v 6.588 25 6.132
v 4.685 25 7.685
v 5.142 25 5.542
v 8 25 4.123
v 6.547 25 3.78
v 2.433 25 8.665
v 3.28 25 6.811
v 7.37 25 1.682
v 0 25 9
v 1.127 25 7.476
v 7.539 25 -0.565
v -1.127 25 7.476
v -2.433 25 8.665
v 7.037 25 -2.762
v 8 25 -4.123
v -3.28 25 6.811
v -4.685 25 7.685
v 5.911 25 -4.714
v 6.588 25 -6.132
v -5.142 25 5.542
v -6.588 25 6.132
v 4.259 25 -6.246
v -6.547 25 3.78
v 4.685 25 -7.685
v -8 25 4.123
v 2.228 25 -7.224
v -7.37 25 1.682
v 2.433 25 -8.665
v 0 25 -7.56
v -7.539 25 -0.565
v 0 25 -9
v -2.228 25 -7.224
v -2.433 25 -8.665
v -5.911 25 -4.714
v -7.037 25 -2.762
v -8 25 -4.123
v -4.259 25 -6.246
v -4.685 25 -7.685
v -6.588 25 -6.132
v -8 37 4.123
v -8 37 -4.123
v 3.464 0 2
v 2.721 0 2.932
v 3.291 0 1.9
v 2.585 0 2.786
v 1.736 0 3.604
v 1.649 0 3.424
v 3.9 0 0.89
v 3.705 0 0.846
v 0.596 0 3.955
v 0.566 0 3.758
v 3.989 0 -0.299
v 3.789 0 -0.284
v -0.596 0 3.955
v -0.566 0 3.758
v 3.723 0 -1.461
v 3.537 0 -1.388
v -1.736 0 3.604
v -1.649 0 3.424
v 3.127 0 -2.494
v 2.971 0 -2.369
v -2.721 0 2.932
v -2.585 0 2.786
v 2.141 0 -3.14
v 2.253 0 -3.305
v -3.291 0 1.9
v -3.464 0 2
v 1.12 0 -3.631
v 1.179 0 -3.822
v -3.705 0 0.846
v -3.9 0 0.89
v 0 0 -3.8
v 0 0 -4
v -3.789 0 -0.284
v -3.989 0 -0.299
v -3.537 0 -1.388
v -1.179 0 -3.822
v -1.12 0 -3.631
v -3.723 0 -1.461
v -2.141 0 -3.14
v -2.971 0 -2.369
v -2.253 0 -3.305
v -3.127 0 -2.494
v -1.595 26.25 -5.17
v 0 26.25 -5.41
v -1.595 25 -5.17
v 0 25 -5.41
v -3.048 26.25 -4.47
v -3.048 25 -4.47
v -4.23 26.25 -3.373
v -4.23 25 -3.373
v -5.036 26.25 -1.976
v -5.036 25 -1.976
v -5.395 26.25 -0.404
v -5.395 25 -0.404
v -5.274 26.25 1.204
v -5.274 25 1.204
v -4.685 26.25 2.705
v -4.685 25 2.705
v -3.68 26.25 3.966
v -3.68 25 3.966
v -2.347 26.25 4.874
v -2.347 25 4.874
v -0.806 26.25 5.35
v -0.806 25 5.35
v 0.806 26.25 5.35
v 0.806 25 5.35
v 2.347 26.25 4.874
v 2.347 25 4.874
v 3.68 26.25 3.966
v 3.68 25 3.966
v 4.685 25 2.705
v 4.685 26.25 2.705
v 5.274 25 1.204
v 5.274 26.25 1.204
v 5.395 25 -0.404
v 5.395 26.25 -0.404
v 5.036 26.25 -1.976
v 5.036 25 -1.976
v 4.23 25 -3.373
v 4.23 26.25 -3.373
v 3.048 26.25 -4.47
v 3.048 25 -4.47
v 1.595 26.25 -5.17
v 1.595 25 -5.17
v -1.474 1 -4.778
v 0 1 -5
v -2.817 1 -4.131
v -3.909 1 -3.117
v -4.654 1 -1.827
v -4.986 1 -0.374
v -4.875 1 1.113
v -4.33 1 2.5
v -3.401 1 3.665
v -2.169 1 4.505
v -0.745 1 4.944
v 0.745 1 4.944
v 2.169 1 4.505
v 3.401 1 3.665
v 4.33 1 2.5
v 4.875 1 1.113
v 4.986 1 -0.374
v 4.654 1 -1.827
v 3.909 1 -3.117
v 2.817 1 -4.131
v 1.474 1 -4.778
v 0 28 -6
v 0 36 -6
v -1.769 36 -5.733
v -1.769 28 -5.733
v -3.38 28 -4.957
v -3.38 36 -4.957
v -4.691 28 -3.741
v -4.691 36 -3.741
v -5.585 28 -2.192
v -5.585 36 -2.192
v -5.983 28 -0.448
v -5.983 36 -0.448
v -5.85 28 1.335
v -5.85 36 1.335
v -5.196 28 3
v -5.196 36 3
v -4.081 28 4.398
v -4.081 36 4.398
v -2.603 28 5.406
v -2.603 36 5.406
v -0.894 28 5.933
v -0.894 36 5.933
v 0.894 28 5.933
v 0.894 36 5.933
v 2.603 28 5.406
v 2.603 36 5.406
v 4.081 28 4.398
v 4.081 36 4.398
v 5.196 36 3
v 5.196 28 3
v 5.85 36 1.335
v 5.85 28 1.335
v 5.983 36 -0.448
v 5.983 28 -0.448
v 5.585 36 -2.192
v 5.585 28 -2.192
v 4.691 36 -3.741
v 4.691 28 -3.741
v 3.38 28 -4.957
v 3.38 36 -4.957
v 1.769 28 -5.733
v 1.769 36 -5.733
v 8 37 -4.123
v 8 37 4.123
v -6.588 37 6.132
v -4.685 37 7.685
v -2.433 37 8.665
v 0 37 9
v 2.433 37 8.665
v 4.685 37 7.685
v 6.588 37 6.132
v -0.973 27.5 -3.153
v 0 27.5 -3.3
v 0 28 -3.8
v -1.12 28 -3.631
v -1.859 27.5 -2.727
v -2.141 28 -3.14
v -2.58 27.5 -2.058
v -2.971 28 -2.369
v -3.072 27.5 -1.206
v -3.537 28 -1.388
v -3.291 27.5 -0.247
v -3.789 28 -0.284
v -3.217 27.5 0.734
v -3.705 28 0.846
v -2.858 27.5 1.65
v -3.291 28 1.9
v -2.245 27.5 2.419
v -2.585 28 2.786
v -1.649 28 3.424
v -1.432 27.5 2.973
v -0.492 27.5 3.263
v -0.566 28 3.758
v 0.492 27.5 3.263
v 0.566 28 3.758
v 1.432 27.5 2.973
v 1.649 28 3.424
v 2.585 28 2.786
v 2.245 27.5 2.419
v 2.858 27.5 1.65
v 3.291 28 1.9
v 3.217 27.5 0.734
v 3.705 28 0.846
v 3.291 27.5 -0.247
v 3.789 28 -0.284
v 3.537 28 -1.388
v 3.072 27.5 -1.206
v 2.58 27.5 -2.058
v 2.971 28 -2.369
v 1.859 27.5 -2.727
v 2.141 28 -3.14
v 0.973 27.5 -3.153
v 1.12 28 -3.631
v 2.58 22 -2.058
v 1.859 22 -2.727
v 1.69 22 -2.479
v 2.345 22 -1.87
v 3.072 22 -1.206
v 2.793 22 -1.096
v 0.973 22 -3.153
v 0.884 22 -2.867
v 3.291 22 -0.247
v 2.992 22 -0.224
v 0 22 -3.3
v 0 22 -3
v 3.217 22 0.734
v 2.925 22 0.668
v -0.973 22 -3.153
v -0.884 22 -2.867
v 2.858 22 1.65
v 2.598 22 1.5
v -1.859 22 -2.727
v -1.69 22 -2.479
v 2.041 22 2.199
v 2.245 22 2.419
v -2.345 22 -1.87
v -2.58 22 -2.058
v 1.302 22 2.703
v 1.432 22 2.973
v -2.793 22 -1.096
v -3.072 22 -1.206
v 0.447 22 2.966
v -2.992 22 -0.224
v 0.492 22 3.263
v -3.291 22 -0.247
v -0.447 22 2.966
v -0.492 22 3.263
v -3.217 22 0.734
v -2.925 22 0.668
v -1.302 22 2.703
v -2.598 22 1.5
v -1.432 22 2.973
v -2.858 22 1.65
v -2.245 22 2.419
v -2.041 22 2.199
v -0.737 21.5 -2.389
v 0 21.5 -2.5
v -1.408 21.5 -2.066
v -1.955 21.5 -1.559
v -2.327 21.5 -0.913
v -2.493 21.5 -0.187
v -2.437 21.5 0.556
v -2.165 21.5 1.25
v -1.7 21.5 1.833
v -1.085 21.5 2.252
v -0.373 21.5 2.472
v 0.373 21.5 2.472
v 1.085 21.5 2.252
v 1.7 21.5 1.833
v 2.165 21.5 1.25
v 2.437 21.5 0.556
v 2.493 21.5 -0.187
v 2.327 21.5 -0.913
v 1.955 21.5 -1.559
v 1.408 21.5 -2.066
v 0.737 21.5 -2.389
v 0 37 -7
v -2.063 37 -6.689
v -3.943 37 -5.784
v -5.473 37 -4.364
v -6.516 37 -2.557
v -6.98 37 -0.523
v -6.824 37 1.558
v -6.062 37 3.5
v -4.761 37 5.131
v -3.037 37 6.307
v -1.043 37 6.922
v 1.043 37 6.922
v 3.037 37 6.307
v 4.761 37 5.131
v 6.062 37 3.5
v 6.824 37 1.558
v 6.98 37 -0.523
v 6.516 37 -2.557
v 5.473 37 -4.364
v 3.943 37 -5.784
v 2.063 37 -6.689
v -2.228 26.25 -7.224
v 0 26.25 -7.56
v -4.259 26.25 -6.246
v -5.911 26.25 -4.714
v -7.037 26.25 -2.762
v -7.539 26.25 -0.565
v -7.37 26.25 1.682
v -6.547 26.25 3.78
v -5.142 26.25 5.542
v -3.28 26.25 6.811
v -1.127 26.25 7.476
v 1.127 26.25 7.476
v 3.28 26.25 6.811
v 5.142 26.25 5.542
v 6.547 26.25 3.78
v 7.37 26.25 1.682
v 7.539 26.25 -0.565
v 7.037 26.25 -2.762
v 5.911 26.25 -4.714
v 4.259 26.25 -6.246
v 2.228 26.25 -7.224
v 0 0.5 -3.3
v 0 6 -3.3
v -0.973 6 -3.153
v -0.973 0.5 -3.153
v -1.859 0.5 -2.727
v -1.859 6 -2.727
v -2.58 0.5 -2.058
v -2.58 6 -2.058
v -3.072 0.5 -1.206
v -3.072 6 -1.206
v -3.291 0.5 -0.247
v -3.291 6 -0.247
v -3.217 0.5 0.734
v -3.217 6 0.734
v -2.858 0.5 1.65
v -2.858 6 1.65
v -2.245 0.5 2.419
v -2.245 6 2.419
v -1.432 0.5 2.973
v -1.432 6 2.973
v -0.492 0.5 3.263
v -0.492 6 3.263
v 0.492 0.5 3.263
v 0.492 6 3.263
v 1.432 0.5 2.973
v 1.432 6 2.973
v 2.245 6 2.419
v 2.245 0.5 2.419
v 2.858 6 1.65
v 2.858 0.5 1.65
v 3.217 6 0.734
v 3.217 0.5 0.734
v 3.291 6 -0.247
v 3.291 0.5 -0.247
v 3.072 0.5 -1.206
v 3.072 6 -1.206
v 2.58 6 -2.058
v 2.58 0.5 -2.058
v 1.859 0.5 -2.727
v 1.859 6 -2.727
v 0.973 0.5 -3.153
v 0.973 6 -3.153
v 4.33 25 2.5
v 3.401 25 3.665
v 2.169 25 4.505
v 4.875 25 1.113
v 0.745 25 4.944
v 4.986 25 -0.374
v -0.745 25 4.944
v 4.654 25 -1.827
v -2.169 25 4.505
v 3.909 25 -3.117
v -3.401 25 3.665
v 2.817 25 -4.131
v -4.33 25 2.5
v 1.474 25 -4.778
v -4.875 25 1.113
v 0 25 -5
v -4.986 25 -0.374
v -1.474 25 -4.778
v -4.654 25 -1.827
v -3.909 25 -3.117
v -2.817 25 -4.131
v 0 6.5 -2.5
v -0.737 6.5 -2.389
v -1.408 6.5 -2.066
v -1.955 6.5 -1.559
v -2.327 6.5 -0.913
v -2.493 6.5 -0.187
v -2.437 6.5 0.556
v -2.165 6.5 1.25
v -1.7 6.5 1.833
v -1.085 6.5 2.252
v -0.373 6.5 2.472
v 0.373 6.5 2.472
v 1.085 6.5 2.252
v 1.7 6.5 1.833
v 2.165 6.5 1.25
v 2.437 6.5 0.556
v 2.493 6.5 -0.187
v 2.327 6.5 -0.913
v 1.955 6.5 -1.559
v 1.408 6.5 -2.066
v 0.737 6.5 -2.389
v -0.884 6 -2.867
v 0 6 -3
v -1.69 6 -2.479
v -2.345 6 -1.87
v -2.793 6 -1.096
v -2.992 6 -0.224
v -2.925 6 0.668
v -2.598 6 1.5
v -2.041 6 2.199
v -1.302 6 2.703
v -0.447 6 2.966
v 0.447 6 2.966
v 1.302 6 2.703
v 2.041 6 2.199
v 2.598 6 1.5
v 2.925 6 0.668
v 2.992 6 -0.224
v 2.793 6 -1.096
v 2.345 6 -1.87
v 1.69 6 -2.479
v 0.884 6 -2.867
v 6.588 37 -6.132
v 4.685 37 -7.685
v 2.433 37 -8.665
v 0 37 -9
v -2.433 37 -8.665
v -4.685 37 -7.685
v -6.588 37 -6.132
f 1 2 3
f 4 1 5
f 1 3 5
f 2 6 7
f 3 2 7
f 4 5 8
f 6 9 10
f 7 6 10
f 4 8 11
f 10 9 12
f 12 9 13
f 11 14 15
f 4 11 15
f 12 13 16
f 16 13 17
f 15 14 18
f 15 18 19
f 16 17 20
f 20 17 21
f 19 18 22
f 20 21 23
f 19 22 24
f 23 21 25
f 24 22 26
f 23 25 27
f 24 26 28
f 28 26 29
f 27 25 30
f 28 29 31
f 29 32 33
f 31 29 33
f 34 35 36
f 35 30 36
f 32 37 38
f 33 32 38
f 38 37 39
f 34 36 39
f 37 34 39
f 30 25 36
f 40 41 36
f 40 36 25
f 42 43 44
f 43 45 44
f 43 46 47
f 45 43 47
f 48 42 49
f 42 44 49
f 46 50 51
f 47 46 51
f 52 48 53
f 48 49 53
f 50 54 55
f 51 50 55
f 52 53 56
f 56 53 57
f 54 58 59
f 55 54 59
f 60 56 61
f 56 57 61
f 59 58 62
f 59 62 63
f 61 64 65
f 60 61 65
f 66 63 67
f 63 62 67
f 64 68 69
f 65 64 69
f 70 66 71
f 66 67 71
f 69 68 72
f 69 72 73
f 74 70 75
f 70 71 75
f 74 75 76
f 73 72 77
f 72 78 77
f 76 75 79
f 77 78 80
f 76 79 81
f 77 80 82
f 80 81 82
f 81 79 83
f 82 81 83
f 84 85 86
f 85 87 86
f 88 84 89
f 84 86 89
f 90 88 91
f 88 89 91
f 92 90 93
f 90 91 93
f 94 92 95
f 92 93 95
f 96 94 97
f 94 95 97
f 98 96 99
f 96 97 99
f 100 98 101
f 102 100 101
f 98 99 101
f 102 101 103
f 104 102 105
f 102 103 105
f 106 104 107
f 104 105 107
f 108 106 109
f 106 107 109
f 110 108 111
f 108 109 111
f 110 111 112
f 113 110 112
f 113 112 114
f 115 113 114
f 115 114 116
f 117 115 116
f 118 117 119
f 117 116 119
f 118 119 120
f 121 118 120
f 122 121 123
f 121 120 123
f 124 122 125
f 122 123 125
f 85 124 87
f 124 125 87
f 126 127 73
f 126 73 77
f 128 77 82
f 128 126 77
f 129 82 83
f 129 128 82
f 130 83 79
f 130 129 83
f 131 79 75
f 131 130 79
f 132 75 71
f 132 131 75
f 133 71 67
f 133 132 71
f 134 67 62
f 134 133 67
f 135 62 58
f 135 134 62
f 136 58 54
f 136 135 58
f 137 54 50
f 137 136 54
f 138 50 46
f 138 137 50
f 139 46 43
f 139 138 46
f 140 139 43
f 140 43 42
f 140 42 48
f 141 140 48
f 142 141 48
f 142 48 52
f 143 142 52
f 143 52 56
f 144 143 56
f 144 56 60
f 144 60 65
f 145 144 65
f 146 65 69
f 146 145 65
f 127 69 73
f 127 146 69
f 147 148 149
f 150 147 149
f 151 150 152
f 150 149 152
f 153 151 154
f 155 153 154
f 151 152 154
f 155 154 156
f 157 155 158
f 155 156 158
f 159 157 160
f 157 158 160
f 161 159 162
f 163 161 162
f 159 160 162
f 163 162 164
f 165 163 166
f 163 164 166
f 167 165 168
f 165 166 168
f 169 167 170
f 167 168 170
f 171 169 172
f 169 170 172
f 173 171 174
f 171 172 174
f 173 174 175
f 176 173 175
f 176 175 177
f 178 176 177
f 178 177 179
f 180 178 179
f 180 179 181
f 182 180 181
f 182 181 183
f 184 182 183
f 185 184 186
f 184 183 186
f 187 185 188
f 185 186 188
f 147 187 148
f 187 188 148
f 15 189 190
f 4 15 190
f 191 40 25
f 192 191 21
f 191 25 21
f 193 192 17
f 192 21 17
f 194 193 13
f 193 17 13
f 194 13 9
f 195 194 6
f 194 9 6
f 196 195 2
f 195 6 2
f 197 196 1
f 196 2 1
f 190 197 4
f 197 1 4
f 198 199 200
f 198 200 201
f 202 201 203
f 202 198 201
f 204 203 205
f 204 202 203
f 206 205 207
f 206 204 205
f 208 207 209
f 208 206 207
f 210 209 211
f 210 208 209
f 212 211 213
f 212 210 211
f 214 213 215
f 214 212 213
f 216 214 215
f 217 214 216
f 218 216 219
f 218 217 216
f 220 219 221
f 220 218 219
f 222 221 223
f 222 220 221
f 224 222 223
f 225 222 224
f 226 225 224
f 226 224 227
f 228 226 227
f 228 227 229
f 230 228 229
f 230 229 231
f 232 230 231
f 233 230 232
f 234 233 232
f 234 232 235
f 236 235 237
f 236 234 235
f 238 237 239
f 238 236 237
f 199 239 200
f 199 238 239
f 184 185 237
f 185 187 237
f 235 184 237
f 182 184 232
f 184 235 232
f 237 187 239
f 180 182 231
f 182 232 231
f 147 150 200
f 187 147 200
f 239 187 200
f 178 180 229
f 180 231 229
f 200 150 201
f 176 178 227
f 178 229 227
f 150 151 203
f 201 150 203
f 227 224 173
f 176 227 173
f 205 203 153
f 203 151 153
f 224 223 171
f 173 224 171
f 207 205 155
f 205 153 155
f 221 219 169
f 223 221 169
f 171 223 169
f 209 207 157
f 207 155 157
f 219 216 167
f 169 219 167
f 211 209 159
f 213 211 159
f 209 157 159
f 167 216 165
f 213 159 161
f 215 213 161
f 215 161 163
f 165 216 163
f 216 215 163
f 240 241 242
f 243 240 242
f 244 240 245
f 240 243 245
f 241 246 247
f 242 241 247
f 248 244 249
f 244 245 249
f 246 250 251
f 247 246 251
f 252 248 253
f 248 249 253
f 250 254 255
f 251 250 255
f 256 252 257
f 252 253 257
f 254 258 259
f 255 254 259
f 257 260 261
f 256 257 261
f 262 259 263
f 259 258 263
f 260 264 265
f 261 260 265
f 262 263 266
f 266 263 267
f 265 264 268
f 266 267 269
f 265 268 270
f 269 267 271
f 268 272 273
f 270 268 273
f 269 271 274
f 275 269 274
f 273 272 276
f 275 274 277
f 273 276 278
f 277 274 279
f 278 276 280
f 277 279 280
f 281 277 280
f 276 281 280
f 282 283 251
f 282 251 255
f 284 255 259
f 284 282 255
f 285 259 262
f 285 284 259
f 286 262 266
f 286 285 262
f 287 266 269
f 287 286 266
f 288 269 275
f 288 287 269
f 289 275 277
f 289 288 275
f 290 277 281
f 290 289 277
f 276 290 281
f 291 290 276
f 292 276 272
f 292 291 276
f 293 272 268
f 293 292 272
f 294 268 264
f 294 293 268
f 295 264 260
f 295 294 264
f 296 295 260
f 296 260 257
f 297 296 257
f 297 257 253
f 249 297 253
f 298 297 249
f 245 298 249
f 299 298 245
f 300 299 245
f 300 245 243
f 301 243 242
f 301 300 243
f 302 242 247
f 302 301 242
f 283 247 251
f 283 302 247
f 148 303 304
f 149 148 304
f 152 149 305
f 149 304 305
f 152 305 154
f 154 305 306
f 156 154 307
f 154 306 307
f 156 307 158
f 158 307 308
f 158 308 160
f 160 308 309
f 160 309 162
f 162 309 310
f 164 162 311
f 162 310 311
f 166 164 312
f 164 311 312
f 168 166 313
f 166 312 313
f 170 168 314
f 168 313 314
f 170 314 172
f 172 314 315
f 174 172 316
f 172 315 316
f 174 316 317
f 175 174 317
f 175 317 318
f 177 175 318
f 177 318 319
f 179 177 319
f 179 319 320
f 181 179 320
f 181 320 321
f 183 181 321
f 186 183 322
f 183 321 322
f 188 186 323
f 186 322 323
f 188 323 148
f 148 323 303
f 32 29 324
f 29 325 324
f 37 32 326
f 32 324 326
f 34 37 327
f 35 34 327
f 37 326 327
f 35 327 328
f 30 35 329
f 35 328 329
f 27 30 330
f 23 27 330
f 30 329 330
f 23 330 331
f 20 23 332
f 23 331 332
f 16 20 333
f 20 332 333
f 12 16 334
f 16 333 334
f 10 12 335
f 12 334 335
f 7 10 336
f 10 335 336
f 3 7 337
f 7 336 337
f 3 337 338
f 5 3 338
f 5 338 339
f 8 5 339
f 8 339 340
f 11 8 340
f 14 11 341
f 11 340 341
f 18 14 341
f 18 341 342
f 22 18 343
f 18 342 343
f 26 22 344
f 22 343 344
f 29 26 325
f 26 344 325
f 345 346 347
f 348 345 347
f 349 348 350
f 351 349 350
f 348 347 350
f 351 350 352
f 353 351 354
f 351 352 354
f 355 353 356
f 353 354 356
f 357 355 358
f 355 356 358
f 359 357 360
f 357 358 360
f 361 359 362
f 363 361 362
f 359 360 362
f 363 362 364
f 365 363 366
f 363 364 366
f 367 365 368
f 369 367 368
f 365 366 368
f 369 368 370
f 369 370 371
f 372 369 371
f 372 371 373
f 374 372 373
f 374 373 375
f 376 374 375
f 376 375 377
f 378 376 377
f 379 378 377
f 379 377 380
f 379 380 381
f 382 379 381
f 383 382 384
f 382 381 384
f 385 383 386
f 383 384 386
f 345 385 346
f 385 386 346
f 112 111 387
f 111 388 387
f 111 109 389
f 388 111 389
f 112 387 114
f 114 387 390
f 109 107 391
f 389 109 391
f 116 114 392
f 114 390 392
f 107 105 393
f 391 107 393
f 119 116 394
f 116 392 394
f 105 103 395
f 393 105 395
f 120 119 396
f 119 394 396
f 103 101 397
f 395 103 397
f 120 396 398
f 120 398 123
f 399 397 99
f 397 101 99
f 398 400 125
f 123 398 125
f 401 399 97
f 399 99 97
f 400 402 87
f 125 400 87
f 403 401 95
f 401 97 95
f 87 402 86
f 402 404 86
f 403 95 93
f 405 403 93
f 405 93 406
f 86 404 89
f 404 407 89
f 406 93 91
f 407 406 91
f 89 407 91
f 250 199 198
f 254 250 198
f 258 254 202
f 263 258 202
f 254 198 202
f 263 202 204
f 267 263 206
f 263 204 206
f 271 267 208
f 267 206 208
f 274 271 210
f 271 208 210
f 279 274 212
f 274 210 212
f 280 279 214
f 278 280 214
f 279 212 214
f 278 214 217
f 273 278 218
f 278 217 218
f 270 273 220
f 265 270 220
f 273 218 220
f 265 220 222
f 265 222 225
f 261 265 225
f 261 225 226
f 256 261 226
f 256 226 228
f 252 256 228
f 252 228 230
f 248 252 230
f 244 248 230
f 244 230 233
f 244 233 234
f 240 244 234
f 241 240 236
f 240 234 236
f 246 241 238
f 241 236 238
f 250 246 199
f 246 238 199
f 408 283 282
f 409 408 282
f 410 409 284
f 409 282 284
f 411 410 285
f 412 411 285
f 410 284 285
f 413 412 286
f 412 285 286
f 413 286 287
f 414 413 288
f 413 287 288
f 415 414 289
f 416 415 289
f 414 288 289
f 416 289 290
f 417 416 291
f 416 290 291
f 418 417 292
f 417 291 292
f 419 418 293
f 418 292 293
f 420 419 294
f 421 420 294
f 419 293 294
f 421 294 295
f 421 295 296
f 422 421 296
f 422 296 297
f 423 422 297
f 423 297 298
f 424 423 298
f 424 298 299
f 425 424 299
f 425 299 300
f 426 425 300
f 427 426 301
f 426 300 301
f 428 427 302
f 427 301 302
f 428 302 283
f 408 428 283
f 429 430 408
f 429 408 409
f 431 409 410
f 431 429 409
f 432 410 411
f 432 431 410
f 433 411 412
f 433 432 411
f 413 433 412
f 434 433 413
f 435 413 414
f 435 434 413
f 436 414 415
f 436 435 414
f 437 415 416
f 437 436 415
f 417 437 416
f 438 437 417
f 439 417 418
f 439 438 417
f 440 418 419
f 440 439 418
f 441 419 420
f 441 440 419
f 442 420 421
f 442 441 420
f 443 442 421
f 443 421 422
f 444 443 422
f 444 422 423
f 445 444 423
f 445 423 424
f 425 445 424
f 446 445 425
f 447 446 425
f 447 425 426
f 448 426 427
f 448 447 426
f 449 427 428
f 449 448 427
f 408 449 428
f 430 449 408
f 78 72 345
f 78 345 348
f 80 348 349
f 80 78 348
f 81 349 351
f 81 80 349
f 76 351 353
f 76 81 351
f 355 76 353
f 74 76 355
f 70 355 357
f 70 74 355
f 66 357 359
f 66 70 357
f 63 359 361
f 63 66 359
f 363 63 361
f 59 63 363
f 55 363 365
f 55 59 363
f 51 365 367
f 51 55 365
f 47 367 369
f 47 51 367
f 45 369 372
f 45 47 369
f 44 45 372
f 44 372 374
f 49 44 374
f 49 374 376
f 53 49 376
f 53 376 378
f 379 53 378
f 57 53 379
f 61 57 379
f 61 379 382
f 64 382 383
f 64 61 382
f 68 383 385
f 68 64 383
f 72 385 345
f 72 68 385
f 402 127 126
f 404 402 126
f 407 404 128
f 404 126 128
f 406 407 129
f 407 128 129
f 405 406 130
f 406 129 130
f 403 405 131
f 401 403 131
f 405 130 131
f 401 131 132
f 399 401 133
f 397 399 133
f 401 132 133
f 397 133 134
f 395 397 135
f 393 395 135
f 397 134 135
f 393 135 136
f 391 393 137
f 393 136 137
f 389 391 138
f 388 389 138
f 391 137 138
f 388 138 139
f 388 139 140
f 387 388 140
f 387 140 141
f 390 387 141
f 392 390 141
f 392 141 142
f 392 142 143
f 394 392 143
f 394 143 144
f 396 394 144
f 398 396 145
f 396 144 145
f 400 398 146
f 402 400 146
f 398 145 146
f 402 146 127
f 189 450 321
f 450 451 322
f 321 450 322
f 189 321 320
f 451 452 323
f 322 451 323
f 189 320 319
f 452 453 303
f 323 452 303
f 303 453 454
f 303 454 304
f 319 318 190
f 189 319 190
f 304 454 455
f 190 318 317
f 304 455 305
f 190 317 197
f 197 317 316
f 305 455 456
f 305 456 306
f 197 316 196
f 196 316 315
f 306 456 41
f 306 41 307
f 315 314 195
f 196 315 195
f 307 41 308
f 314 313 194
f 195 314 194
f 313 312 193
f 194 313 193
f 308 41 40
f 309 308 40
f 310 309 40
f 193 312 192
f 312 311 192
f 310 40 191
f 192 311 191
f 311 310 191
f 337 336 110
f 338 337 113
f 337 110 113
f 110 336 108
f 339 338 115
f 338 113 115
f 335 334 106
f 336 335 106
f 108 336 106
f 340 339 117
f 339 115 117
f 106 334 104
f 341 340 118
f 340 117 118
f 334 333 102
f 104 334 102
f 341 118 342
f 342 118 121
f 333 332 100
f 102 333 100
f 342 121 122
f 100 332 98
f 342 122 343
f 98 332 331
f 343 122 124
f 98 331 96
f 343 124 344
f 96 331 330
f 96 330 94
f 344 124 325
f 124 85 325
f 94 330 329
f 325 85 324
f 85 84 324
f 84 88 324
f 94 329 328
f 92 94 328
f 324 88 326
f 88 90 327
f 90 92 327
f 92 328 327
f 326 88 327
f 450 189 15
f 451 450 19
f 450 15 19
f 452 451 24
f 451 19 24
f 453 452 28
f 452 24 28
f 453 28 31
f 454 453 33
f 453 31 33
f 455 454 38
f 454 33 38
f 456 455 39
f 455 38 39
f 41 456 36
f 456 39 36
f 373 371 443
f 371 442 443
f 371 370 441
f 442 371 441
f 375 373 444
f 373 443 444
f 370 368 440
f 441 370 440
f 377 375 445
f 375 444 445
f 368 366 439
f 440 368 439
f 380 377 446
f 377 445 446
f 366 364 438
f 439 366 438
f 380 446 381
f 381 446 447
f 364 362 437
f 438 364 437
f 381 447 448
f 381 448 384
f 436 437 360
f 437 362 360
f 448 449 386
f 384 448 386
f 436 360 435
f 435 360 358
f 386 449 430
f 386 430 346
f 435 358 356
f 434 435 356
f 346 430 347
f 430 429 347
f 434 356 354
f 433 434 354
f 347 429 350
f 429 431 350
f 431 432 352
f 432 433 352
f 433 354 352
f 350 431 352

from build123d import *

# Parameters (mm, degrees)
ENL_V_MAT_EXTRU_1_DEPTH = 40.127995093
CHANFREIN1_SIZE         = 1
CHANFREIN2_SIZE         = 0.5
CHANFREIN3_SIZE         = 1


with BuildPart() as part:
    # Esquisse1 → Révolution1 (revolve)
    with BuildSketch(Plane.XY, mode=Mode.PRIVATE) as r_volution1_sk:
        Polygon((3.3, 6), (2.5, 6), (2.5, 22), (3.3, 22), (3.3, 28), (6, 28), (6, 37), (9, 37), (9, 25), (7.56, 25), (7.56, 26.25), (5.41, 26.25), (5.41, 25), (5, 25), (5, 0), (3.3, 0), align=None)
    revolve(r_volution1_sk.sketch.rotate(Axis((0, 0, 0), (0, 1, 0)), 90), axis=Axis((0, 0, 0), (0, 1, 0)))

    # Esquisse2 → Enlèv. mat.-Extru.1 (cut, through all)
    with BuildSketch(Plane(origin=(0, 37, 0), x_dir=(1, 0, 0), z_dir=(0, 1, 0))):
        with BuildLine():
            Line((-8, 4.123105626), (-8, -4.123105626))
            ThreePointArc((-8, -4.123105626), (-9, 0), (-8, 4.123105626))
        make_face()
        with BuildLine():
            Line((8, 4.123105626), (8, -4.123105626))
            ThreePointArc((8, -4.123105626), (9, 0), (8, 4.123105626))
        make_face()
    extrude(amount=-ENL_V_MAT_EXTRU_1_DEPTH, mode=Mode.SUBTRACT)

    # Chanfrein1
    chanfrein1_edges = [part.edges().sort_by_distance(p)[0] for p in [
        (0, 37, 6),
    ]]
    chamfer(chanfrein1_edges, length=CHANFREIN1_SIZE)

    # Chanfrein2
    chanfrein2_edges = [part.edges().sort_by_distance(p)[0] for p in [
        (0, 6, 2.5),
        (0, 22, 2.5),
        (0, 28, 3.3),
        (0, 0, 3.3),
    ]]
    chamfer(chanfrein2_edges, length=CHANFREIN2_SIZE)

    # Chanfrein3
    chanfrein3_edges = [part.edges().sort_by_distance(p)[0] for p in [
        (0, 0, 5),
    ]]
    chamfer(chanfrein3_edges, length=CHANFREIN3_SIZE)


solid = part.part
